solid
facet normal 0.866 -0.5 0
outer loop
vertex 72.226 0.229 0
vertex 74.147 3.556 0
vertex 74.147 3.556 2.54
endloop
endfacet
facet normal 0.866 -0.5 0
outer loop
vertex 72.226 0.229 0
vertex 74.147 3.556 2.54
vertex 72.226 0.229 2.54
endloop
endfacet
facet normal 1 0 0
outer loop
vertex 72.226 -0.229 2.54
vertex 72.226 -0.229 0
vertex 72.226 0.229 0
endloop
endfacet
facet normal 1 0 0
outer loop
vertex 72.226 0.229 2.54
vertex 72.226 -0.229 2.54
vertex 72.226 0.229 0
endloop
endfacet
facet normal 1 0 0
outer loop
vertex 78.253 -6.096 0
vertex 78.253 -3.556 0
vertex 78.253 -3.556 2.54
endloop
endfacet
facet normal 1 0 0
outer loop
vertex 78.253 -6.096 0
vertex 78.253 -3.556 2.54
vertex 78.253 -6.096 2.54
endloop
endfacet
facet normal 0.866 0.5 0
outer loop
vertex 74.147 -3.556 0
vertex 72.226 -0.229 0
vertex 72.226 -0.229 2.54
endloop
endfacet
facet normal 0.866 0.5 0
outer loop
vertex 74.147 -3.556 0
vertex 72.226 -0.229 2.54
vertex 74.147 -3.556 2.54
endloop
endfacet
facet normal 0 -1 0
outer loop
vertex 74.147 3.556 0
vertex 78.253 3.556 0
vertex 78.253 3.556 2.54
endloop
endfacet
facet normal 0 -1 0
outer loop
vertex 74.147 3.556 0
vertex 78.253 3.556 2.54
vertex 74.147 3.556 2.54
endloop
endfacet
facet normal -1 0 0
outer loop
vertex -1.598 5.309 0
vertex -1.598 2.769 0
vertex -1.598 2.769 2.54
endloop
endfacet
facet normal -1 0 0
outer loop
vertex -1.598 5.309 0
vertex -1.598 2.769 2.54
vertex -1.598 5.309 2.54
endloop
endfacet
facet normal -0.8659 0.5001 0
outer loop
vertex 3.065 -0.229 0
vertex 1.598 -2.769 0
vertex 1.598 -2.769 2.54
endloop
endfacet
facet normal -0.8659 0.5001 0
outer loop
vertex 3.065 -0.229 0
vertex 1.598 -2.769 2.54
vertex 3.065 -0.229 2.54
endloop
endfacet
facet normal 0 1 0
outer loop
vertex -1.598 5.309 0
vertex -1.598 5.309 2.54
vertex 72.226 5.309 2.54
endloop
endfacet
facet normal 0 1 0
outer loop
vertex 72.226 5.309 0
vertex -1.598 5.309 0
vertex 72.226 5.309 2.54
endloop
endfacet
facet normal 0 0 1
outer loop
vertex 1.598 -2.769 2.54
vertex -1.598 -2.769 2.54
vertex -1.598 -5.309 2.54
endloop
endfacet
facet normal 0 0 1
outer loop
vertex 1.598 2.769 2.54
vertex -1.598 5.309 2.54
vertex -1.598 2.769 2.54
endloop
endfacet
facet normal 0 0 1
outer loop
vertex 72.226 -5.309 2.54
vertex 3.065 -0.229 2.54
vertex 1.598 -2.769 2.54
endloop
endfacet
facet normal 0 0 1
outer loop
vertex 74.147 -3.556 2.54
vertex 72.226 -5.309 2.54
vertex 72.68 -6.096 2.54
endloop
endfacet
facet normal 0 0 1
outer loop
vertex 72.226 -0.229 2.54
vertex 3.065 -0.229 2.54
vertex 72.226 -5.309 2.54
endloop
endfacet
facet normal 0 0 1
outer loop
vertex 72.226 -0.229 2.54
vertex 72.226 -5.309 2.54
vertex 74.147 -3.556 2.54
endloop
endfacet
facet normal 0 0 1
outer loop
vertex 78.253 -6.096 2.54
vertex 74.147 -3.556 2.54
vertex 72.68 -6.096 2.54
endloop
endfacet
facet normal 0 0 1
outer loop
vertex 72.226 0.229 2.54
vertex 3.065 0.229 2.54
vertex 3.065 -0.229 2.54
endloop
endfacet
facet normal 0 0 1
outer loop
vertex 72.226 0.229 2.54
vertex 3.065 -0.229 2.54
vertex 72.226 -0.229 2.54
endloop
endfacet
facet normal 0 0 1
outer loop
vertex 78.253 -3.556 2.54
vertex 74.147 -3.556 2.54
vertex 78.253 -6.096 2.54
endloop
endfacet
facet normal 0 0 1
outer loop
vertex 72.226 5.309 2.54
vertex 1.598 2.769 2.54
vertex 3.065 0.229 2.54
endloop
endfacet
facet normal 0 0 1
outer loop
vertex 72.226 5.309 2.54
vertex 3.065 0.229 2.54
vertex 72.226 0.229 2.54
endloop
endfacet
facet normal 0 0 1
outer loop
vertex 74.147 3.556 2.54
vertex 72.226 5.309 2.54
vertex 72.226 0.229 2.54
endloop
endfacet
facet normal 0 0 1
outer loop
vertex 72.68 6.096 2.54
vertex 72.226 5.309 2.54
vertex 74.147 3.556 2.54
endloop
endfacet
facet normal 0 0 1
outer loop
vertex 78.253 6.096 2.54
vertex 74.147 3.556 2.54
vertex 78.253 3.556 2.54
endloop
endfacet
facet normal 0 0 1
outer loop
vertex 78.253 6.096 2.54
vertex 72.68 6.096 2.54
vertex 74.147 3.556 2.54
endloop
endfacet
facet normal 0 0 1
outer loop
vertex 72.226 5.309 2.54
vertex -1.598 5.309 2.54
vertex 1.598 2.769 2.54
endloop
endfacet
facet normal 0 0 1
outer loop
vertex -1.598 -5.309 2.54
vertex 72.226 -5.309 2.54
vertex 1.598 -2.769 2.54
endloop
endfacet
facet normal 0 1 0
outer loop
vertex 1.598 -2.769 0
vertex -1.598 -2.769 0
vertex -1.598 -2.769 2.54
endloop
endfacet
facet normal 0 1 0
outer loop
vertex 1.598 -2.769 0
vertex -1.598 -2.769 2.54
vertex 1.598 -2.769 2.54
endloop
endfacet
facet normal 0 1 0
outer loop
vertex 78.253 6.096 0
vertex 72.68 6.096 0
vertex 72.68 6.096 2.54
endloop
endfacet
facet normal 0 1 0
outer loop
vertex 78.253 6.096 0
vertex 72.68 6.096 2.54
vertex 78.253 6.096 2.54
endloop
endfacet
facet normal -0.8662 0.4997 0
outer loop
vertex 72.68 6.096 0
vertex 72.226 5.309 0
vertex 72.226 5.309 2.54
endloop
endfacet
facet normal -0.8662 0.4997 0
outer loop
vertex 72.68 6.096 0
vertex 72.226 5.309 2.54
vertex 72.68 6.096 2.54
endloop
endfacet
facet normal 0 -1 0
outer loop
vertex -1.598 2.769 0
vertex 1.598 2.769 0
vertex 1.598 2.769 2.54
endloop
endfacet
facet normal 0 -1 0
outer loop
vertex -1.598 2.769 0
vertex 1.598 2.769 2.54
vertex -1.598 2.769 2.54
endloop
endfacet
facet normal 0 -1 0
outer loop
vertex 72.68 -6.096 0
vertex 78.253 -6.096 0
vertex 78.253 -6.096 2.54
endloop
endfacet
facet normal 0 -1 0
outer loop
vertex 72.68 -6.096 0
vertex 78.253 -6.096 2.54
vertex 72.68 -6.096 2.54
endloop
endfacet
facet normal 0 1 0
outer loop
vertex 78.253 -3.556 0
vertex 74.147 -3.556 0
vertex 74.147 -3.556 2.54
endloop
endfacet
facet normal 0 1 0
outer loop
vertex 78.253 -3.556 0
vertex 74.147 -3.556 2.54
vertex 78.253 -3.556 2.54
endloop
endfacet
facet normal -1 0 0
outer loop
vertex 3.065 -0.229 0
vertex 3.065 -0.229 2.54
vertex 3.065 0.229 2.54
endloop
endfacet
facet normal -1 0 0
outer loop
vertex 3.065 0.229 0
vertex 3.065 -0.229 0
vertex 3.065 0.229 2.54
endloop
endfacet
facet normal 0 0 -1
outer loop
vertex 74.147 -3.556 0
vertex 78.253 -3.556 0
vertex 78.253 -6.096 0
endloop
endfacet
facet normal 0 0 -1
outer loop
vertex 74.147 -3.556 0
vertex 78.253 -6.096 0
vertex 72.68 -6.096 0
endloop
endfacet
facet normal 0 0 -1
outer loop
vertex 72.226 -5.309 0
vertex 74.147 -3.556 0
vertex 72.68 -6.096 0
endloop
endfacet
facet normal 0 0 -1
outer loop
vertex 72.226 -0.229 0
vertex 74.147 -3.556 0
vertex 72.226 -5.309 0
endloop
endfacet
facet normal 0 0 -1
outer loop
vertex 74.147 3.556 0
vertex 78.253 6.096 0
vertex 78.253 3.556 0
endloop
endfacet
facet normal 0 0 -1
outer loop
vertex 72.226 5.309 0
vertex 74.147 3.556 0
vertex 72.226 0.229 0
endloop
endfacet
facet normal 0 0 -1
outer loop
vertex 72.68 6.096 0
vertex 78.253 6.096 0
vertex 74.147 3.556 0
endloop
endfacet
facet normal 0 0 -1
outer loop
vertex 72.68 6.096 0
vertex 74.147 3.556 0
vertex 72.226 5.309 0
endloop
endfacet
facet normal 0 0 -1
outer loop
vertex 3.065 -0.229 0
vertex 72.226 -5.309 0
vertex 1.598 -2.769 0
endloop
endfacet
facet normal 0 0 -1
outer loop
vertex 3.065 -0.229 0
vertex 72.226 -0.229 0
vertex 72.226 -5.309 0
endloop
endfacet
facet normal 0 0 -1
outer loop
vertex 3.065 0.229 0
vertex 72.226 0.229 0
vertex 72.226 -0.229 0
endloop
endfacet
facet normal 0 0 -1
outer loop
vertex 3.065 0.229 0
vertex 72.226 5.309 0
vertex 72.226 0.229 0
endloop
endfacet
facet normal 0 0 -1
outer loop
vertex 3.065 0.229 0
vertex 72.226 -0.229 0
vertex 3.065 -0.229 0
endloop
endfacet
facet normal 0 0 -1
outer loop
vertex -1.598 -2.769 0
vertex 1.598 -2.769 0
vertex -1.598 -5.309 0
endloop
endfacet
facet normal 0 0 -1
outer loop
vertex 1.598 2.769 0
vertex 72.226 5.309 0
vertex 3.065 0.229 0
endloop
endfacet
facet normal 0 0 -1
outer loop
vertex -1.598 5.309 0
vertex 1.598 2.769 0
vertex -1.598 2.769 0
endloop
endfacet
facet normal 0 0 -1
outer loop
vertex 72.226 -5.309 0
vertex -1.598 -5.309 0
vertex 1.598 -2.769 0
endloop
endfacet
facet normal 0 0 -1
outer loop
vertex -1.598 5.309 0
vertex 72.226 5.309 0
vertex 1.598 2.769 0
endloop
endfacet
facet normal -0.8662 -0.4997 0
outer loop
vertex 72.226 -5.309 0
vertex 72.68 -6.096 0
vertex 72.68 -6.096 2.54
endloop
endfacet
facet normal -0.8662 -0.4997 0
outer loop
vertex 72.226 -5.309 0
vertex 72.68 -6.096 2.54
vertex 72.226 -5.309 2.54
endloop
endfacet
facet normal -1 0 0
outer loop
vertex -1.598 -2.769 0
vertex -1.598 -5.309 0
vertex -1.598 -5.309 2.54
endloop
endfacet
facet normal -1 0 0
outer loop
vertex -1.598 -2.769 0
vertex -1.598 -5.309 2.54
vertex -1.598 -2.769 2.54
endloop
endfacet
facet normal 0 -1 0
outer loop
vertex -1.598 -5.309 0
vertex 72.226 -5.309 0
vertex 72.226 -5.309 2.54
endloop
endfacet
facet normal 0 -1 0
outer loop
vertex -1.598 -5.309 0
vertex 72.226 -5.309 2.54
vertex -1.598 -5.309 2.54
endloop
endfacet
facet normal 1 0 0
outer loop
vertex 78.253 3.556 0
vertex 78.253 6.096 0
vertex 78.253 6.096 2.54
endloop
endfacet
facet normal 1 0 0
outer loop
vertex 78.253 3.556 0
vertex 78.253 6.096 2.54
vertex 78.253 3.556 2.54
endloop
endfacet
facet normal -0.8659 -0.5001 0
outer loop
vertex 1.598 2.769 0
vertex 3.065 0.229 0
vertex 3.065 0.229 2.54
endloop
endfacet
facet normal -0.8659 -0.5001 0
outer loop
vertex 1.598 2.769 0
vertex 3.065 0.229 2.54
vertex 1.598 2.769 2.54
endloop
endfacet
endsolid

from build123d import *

# Parameters (mm, degrees)
BOSS_EXTRUDE1_DEPTH = 2.54
SKETCH3_W           = 69.160945518
SKETCH3_H           = 10.6172
BOSS_EXTRUDE2_DEPTH = 2.54


with BuildPart() as part:
    # Sketch1 → Boss-Extrude1 (new body)
    with BuildSketch(Plane.XY):
        Polygon((70.693406338, 2.6543), (72.680472759, 6.096), (78.253057557, 6.096), (78.253057557, 3.556), (74.146942443, 3.556), (72.093884886, 0), (74.146942443, -3.556), (78.253057557, -3.556), (78.253057557, -6.096), (72.680472759, -6.096), (70.693406338, -2.6543), (4.597382459, -2.6543), (3.064921639, -5.3086), (-1.598451955, -5.3086), (-1.598451955, -2.7686), (1.598451955, -2.7686), (3.196903911, 0), (1.598451955, 2.7686), (-1.598451955, 2.7686), (-1.598451955, 5.3086), (3.064921639, 5.3086), (4.597382459, 2.6543), align=None)
    extrude(amount=BOSS_EXTRUDE1_DEPTH)

    # Sketch3 → Boss-Extrude2 (add)
    with BuildSketch(Plane.XY.offset(2.54)):
        with Locations((37.645394398, 0)):
            Rectangle(SKETCH3_W, SKETCH3_H)
    extrude(amount=-BOSS_EXTRUDE2_DEPTH)


solid = part.part
